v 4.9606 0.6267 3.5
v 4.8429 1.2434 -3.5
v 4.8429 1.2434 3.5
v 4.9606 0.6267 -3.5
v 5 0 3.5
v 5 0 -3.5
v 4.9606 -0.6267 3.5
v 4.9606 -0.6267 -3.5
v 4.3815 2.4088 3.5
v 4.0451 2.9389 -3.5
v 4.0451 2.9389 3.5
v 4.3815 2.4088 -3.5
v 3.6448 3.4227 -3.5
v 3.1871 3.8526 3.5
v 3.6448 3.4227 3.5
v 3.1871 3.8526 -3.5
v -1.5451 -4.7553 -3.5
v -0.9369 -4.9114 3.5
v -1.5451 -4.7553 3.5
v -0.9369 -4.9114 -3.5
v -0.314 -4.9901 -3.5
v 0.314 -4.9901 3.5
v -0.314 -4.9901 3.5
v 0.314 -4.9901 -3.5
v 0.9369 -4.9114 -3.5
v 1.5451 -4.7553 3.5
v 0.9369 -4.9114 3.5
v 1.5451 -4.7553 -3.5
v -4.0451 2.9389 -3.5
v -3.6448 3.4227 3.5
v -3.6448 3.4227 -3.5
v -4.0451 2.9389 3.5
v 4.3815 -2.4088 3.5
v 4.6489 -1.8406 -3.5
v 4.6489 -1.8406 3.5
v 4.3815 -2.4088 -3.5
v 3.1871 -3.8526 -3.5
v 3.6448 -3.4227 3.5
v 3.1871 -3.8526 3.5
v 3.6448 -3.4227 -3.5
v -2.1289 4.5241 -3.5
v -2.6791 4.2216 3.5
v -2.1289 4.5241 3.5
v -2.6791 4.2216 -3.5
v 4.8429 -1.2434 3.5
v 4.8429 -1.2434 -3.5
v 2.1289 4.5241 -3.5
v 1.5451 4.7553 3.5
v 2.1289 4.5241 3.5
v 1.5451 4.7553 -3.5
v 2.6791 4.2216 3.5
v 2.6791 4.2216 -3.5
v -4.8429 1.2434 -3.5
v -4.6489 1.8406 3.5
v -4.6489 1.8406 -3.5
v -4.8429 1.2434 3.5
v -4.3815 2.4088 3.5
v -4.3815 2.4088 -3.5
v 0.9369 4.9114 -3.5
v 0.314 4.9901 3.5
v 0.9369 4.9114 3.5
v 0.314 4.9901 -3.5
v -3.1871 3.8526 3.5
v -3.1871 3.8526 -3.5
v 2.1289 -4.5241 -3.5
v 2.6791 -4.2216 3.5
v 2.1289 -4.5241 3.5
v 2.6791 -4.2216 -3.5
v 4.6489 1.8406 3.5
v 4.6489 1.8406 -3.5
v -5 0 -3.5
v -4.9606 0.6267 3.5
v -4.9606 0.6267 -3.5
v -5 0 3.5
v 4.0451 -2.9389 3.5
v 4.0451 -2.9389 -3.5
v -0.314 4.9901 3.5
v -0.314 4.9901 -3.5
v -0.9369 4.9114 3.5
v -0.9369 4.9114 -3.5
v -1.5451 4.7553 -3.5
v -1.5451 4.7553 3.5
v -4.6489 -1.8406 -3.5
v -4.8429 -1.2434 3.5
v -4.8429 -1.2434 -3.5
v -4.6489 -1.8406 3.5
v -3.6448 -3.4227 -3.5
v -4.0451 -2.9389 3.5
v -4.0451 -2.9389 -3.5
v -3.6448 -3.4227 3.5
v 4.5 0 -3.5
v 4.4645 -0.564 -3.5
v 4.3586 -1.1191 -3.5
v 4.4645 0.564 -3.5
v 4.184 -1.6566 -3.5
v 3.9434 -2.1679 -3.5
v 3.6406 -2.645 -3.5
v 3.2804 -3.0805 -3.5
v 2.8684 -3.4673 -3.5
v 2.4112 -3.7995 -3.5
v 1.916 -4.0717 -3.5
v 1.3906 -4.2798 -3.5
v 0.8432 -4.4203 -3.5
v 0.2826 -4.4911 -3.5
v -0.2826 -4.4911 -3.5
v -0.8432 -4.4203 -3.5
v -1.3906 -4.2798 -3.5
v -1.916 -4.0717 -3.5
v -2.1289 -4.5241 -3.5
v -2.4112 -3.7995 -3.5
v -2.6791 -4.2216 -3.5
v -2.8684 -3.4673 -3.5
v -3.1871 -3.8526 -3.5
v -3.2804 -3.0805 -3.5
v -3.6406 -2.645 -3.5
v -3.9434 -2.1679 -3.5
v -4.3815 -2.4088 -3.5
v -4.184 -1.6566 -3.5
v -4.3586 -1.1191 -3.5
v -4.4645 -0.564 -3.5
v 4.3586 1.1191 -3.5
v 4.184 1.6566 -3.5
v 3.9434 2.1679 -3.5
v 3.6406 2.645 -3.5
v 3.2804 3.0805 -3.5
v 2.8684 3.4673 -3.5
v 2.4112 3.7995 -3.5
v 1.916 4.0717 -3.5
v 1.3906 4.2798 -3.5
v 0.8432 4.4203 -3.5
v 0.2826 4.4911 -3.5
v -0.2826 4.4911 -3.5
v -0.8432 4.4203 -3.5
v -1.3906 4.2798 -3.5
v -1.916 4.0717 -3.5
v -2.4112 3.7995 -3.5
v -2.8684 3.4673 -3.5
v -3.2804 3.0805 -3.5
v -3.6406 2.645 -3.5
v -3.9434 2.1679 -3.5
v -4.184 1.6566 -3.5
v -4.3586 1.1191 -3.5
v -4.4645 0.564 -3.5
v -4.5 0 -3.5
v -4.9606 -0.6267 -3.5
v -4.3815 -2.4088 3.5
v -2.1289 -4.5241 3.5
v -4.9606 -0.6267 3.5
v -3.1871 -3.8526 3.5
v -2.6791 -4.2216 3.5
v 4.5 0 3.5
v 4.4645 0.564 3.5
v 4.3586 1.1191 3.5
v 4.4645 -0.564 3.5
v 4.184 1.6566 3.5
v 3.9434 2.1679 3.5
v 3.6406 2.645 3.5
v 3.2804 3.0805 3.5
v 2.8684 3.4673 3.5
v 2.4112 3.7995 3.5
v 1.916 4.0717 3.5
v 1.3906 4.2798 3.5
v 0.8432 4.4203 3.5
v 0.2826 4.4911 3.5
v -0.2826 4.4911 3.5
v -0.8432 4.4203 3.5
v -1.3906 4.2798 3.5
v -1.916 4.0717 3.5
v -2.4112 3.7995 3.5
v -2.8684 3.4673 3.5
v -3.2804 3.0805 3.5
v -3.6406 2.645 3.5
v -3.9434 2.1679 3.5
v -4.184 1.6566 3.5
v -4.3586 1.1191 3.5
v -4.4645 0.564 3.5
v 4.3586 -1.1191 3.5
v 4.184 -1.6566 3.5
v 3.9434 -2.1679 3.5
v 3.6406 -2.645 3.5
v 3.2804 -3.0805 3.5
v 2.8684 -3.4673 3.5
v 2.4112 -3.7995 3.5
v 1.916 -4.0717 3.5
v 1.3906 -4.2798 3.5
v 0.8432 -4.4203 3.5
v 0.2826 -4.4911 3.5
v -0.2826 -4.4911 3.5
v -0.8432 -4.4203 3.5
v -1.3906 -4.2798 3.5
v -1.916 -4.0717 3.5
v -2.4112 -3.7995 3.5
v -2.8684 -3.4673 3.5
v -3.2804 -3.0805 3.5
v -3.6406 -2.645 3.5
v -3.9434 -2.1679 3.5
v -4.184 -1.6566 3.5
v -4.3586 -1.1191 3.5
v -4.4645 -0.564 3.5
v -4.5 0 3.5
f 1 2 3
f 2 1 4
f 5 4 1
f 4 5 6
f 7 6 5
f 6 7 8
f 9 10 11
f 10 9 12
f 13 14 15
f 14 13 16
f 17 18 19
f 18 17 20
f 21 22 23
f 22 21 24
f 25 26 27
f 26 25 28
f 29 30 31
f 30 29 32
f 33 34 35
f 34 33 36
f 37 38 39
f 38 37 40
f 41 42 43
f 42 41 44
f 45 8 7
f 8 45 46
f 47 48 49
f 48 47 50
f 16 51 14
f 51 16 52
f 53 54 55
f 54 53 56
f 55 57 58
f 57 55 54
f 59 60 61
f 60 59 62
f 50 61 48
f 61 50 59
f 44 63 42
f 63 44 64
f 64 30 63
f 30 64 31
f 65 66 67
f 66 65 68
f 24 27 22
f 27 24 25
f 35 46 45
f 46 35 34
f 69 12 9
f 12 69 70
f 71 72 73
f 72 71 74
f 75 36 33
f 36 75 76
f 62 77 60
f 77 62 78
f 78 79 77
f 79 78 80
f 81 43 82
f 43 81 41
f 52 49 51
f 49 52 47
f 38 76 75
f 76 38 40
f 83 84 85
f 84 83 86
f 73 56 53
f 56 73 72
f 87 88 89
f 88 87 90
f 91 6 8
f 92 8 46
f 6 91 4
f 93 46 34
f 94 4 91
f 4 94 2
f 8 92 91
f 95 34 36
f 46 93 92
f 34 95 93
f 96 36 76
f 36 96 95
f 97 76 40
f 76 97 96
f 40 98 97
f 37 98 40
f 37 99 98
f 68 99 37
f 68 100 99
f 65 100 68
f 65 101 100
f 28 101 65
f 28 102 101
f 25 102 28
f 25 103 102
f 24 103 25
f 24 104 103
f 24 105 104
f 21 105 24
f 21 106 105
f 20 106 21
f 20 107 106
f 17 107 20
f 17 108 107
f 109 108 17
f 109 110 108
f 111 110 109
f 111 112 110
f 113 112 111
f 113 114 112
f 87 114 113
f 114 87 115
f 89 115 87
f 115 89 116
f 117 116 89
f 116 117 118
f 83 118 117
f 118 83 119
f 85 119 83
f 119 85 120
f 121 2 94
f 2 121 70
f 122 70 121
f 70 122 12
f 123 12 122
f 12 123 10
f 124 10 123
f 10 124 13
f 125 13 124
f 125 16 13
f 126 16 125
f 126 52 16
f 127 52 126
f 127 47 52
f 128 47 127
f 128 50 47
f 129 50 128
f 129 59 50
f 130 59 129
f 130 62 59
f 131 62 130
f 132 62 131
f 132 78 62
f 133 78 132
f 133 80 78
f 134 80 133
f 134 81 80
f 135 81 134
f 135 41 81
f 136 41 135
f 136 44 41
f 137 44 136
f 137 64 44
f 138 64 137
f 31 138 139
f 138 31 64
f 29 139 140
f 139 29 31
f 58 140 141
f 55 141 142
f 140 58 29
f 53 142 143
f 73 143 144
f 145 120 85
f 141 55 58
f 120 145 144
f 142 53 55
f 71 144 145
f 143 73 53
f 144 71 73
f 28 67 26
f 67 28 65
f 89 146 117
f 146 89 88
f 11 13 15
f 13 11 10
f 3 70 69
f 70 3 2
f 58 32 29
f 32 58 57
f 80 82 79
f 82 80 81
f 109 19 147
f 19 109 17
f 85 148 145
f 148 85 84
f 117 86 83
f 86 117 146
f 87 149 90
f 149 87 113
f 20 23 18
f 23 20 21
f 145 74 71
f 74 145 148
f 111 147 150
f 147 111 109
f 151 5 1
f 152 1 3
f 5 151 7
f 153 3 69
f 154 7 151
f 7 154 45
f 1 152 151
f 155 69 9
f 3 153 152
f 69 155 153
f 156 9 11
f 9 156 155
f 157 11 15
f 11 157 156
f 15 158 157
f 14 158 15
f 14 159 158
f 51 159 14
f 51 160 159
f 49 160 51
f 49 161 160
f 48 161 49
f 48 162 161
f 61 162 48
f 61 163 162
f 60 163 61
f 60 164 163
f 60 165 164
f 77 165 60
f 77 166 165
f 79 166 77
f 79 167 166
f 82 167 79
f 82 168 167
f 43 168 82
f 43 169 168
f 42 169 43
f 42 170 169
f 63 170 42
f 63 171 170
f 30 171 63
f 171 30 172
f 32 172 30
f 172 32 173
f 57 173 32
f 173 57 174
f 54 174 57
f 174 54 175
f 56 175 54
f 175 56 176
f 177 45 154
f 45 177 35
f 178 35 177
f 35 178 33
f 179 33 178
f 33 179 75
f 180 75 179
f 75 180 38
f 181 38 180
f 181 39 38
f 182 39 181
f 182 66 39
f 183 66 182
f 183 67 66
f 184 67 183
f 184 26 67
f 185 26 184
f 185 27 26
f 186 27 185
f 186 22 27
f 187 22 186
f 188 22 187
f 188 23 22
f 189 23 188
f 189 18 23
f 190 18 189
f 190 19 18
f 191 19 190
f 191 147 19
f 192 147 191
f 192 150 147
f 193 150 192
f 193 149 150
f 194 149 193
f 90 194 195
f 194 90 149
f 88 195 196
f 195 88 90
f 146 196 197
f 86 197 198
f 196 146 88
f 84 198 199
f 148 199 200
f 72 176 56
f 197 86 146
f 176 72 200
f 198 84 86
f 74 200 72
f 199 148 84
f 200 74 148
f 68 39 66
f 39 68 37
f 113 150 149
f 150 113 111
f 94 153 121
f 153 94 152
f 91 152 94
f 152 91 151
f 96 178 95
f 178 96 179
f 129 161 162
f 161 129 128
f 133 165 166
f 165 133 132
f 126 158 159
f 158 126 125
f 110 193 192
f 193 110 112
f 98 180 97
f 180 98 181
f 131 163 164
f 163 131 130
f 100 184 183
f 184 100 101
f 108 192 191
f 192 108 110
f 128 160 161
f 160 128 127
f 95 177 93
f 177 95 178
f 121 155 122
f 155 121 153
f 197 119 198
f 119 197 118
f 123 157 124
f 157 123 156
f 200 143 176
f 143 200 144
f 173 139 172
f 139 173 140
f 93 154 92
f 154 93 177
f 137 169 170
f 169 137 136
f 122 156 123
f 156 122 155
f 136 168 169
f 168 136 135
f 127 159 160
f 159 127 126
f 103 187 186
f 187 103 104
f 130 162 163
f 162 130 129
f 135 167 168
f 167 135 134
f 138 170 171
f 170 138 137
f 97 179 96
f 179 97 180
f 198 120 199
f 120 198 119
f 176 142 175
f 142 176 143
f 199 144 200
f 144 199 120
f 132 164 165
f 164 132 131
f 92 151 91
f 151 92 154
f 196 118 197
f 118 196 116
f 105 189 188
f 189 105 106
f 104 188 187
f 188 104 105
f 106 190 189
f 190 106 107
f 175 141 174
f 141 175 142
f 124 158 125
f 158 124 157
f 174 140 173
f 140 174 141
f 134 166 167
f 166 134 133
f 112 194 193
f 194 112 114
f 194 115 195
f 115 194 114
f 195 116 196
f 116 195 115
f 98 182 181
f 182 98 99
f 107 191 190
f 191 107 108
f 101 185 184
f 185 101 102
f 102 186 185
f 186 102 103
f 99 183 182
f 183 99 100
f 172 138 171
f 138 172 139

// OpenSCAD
$fn = 50;


difference() {
	union() {
		translate(v = [0, 0, -3.5000000000]) {
			cylinder(h = 7, r = 5.0000000000);
		}
	}
	union() {
		translate(v = [0, 0, -100.0000000000]) {
			cylinder(h = 200, r = 4.5000000000);
		}
	}
}
